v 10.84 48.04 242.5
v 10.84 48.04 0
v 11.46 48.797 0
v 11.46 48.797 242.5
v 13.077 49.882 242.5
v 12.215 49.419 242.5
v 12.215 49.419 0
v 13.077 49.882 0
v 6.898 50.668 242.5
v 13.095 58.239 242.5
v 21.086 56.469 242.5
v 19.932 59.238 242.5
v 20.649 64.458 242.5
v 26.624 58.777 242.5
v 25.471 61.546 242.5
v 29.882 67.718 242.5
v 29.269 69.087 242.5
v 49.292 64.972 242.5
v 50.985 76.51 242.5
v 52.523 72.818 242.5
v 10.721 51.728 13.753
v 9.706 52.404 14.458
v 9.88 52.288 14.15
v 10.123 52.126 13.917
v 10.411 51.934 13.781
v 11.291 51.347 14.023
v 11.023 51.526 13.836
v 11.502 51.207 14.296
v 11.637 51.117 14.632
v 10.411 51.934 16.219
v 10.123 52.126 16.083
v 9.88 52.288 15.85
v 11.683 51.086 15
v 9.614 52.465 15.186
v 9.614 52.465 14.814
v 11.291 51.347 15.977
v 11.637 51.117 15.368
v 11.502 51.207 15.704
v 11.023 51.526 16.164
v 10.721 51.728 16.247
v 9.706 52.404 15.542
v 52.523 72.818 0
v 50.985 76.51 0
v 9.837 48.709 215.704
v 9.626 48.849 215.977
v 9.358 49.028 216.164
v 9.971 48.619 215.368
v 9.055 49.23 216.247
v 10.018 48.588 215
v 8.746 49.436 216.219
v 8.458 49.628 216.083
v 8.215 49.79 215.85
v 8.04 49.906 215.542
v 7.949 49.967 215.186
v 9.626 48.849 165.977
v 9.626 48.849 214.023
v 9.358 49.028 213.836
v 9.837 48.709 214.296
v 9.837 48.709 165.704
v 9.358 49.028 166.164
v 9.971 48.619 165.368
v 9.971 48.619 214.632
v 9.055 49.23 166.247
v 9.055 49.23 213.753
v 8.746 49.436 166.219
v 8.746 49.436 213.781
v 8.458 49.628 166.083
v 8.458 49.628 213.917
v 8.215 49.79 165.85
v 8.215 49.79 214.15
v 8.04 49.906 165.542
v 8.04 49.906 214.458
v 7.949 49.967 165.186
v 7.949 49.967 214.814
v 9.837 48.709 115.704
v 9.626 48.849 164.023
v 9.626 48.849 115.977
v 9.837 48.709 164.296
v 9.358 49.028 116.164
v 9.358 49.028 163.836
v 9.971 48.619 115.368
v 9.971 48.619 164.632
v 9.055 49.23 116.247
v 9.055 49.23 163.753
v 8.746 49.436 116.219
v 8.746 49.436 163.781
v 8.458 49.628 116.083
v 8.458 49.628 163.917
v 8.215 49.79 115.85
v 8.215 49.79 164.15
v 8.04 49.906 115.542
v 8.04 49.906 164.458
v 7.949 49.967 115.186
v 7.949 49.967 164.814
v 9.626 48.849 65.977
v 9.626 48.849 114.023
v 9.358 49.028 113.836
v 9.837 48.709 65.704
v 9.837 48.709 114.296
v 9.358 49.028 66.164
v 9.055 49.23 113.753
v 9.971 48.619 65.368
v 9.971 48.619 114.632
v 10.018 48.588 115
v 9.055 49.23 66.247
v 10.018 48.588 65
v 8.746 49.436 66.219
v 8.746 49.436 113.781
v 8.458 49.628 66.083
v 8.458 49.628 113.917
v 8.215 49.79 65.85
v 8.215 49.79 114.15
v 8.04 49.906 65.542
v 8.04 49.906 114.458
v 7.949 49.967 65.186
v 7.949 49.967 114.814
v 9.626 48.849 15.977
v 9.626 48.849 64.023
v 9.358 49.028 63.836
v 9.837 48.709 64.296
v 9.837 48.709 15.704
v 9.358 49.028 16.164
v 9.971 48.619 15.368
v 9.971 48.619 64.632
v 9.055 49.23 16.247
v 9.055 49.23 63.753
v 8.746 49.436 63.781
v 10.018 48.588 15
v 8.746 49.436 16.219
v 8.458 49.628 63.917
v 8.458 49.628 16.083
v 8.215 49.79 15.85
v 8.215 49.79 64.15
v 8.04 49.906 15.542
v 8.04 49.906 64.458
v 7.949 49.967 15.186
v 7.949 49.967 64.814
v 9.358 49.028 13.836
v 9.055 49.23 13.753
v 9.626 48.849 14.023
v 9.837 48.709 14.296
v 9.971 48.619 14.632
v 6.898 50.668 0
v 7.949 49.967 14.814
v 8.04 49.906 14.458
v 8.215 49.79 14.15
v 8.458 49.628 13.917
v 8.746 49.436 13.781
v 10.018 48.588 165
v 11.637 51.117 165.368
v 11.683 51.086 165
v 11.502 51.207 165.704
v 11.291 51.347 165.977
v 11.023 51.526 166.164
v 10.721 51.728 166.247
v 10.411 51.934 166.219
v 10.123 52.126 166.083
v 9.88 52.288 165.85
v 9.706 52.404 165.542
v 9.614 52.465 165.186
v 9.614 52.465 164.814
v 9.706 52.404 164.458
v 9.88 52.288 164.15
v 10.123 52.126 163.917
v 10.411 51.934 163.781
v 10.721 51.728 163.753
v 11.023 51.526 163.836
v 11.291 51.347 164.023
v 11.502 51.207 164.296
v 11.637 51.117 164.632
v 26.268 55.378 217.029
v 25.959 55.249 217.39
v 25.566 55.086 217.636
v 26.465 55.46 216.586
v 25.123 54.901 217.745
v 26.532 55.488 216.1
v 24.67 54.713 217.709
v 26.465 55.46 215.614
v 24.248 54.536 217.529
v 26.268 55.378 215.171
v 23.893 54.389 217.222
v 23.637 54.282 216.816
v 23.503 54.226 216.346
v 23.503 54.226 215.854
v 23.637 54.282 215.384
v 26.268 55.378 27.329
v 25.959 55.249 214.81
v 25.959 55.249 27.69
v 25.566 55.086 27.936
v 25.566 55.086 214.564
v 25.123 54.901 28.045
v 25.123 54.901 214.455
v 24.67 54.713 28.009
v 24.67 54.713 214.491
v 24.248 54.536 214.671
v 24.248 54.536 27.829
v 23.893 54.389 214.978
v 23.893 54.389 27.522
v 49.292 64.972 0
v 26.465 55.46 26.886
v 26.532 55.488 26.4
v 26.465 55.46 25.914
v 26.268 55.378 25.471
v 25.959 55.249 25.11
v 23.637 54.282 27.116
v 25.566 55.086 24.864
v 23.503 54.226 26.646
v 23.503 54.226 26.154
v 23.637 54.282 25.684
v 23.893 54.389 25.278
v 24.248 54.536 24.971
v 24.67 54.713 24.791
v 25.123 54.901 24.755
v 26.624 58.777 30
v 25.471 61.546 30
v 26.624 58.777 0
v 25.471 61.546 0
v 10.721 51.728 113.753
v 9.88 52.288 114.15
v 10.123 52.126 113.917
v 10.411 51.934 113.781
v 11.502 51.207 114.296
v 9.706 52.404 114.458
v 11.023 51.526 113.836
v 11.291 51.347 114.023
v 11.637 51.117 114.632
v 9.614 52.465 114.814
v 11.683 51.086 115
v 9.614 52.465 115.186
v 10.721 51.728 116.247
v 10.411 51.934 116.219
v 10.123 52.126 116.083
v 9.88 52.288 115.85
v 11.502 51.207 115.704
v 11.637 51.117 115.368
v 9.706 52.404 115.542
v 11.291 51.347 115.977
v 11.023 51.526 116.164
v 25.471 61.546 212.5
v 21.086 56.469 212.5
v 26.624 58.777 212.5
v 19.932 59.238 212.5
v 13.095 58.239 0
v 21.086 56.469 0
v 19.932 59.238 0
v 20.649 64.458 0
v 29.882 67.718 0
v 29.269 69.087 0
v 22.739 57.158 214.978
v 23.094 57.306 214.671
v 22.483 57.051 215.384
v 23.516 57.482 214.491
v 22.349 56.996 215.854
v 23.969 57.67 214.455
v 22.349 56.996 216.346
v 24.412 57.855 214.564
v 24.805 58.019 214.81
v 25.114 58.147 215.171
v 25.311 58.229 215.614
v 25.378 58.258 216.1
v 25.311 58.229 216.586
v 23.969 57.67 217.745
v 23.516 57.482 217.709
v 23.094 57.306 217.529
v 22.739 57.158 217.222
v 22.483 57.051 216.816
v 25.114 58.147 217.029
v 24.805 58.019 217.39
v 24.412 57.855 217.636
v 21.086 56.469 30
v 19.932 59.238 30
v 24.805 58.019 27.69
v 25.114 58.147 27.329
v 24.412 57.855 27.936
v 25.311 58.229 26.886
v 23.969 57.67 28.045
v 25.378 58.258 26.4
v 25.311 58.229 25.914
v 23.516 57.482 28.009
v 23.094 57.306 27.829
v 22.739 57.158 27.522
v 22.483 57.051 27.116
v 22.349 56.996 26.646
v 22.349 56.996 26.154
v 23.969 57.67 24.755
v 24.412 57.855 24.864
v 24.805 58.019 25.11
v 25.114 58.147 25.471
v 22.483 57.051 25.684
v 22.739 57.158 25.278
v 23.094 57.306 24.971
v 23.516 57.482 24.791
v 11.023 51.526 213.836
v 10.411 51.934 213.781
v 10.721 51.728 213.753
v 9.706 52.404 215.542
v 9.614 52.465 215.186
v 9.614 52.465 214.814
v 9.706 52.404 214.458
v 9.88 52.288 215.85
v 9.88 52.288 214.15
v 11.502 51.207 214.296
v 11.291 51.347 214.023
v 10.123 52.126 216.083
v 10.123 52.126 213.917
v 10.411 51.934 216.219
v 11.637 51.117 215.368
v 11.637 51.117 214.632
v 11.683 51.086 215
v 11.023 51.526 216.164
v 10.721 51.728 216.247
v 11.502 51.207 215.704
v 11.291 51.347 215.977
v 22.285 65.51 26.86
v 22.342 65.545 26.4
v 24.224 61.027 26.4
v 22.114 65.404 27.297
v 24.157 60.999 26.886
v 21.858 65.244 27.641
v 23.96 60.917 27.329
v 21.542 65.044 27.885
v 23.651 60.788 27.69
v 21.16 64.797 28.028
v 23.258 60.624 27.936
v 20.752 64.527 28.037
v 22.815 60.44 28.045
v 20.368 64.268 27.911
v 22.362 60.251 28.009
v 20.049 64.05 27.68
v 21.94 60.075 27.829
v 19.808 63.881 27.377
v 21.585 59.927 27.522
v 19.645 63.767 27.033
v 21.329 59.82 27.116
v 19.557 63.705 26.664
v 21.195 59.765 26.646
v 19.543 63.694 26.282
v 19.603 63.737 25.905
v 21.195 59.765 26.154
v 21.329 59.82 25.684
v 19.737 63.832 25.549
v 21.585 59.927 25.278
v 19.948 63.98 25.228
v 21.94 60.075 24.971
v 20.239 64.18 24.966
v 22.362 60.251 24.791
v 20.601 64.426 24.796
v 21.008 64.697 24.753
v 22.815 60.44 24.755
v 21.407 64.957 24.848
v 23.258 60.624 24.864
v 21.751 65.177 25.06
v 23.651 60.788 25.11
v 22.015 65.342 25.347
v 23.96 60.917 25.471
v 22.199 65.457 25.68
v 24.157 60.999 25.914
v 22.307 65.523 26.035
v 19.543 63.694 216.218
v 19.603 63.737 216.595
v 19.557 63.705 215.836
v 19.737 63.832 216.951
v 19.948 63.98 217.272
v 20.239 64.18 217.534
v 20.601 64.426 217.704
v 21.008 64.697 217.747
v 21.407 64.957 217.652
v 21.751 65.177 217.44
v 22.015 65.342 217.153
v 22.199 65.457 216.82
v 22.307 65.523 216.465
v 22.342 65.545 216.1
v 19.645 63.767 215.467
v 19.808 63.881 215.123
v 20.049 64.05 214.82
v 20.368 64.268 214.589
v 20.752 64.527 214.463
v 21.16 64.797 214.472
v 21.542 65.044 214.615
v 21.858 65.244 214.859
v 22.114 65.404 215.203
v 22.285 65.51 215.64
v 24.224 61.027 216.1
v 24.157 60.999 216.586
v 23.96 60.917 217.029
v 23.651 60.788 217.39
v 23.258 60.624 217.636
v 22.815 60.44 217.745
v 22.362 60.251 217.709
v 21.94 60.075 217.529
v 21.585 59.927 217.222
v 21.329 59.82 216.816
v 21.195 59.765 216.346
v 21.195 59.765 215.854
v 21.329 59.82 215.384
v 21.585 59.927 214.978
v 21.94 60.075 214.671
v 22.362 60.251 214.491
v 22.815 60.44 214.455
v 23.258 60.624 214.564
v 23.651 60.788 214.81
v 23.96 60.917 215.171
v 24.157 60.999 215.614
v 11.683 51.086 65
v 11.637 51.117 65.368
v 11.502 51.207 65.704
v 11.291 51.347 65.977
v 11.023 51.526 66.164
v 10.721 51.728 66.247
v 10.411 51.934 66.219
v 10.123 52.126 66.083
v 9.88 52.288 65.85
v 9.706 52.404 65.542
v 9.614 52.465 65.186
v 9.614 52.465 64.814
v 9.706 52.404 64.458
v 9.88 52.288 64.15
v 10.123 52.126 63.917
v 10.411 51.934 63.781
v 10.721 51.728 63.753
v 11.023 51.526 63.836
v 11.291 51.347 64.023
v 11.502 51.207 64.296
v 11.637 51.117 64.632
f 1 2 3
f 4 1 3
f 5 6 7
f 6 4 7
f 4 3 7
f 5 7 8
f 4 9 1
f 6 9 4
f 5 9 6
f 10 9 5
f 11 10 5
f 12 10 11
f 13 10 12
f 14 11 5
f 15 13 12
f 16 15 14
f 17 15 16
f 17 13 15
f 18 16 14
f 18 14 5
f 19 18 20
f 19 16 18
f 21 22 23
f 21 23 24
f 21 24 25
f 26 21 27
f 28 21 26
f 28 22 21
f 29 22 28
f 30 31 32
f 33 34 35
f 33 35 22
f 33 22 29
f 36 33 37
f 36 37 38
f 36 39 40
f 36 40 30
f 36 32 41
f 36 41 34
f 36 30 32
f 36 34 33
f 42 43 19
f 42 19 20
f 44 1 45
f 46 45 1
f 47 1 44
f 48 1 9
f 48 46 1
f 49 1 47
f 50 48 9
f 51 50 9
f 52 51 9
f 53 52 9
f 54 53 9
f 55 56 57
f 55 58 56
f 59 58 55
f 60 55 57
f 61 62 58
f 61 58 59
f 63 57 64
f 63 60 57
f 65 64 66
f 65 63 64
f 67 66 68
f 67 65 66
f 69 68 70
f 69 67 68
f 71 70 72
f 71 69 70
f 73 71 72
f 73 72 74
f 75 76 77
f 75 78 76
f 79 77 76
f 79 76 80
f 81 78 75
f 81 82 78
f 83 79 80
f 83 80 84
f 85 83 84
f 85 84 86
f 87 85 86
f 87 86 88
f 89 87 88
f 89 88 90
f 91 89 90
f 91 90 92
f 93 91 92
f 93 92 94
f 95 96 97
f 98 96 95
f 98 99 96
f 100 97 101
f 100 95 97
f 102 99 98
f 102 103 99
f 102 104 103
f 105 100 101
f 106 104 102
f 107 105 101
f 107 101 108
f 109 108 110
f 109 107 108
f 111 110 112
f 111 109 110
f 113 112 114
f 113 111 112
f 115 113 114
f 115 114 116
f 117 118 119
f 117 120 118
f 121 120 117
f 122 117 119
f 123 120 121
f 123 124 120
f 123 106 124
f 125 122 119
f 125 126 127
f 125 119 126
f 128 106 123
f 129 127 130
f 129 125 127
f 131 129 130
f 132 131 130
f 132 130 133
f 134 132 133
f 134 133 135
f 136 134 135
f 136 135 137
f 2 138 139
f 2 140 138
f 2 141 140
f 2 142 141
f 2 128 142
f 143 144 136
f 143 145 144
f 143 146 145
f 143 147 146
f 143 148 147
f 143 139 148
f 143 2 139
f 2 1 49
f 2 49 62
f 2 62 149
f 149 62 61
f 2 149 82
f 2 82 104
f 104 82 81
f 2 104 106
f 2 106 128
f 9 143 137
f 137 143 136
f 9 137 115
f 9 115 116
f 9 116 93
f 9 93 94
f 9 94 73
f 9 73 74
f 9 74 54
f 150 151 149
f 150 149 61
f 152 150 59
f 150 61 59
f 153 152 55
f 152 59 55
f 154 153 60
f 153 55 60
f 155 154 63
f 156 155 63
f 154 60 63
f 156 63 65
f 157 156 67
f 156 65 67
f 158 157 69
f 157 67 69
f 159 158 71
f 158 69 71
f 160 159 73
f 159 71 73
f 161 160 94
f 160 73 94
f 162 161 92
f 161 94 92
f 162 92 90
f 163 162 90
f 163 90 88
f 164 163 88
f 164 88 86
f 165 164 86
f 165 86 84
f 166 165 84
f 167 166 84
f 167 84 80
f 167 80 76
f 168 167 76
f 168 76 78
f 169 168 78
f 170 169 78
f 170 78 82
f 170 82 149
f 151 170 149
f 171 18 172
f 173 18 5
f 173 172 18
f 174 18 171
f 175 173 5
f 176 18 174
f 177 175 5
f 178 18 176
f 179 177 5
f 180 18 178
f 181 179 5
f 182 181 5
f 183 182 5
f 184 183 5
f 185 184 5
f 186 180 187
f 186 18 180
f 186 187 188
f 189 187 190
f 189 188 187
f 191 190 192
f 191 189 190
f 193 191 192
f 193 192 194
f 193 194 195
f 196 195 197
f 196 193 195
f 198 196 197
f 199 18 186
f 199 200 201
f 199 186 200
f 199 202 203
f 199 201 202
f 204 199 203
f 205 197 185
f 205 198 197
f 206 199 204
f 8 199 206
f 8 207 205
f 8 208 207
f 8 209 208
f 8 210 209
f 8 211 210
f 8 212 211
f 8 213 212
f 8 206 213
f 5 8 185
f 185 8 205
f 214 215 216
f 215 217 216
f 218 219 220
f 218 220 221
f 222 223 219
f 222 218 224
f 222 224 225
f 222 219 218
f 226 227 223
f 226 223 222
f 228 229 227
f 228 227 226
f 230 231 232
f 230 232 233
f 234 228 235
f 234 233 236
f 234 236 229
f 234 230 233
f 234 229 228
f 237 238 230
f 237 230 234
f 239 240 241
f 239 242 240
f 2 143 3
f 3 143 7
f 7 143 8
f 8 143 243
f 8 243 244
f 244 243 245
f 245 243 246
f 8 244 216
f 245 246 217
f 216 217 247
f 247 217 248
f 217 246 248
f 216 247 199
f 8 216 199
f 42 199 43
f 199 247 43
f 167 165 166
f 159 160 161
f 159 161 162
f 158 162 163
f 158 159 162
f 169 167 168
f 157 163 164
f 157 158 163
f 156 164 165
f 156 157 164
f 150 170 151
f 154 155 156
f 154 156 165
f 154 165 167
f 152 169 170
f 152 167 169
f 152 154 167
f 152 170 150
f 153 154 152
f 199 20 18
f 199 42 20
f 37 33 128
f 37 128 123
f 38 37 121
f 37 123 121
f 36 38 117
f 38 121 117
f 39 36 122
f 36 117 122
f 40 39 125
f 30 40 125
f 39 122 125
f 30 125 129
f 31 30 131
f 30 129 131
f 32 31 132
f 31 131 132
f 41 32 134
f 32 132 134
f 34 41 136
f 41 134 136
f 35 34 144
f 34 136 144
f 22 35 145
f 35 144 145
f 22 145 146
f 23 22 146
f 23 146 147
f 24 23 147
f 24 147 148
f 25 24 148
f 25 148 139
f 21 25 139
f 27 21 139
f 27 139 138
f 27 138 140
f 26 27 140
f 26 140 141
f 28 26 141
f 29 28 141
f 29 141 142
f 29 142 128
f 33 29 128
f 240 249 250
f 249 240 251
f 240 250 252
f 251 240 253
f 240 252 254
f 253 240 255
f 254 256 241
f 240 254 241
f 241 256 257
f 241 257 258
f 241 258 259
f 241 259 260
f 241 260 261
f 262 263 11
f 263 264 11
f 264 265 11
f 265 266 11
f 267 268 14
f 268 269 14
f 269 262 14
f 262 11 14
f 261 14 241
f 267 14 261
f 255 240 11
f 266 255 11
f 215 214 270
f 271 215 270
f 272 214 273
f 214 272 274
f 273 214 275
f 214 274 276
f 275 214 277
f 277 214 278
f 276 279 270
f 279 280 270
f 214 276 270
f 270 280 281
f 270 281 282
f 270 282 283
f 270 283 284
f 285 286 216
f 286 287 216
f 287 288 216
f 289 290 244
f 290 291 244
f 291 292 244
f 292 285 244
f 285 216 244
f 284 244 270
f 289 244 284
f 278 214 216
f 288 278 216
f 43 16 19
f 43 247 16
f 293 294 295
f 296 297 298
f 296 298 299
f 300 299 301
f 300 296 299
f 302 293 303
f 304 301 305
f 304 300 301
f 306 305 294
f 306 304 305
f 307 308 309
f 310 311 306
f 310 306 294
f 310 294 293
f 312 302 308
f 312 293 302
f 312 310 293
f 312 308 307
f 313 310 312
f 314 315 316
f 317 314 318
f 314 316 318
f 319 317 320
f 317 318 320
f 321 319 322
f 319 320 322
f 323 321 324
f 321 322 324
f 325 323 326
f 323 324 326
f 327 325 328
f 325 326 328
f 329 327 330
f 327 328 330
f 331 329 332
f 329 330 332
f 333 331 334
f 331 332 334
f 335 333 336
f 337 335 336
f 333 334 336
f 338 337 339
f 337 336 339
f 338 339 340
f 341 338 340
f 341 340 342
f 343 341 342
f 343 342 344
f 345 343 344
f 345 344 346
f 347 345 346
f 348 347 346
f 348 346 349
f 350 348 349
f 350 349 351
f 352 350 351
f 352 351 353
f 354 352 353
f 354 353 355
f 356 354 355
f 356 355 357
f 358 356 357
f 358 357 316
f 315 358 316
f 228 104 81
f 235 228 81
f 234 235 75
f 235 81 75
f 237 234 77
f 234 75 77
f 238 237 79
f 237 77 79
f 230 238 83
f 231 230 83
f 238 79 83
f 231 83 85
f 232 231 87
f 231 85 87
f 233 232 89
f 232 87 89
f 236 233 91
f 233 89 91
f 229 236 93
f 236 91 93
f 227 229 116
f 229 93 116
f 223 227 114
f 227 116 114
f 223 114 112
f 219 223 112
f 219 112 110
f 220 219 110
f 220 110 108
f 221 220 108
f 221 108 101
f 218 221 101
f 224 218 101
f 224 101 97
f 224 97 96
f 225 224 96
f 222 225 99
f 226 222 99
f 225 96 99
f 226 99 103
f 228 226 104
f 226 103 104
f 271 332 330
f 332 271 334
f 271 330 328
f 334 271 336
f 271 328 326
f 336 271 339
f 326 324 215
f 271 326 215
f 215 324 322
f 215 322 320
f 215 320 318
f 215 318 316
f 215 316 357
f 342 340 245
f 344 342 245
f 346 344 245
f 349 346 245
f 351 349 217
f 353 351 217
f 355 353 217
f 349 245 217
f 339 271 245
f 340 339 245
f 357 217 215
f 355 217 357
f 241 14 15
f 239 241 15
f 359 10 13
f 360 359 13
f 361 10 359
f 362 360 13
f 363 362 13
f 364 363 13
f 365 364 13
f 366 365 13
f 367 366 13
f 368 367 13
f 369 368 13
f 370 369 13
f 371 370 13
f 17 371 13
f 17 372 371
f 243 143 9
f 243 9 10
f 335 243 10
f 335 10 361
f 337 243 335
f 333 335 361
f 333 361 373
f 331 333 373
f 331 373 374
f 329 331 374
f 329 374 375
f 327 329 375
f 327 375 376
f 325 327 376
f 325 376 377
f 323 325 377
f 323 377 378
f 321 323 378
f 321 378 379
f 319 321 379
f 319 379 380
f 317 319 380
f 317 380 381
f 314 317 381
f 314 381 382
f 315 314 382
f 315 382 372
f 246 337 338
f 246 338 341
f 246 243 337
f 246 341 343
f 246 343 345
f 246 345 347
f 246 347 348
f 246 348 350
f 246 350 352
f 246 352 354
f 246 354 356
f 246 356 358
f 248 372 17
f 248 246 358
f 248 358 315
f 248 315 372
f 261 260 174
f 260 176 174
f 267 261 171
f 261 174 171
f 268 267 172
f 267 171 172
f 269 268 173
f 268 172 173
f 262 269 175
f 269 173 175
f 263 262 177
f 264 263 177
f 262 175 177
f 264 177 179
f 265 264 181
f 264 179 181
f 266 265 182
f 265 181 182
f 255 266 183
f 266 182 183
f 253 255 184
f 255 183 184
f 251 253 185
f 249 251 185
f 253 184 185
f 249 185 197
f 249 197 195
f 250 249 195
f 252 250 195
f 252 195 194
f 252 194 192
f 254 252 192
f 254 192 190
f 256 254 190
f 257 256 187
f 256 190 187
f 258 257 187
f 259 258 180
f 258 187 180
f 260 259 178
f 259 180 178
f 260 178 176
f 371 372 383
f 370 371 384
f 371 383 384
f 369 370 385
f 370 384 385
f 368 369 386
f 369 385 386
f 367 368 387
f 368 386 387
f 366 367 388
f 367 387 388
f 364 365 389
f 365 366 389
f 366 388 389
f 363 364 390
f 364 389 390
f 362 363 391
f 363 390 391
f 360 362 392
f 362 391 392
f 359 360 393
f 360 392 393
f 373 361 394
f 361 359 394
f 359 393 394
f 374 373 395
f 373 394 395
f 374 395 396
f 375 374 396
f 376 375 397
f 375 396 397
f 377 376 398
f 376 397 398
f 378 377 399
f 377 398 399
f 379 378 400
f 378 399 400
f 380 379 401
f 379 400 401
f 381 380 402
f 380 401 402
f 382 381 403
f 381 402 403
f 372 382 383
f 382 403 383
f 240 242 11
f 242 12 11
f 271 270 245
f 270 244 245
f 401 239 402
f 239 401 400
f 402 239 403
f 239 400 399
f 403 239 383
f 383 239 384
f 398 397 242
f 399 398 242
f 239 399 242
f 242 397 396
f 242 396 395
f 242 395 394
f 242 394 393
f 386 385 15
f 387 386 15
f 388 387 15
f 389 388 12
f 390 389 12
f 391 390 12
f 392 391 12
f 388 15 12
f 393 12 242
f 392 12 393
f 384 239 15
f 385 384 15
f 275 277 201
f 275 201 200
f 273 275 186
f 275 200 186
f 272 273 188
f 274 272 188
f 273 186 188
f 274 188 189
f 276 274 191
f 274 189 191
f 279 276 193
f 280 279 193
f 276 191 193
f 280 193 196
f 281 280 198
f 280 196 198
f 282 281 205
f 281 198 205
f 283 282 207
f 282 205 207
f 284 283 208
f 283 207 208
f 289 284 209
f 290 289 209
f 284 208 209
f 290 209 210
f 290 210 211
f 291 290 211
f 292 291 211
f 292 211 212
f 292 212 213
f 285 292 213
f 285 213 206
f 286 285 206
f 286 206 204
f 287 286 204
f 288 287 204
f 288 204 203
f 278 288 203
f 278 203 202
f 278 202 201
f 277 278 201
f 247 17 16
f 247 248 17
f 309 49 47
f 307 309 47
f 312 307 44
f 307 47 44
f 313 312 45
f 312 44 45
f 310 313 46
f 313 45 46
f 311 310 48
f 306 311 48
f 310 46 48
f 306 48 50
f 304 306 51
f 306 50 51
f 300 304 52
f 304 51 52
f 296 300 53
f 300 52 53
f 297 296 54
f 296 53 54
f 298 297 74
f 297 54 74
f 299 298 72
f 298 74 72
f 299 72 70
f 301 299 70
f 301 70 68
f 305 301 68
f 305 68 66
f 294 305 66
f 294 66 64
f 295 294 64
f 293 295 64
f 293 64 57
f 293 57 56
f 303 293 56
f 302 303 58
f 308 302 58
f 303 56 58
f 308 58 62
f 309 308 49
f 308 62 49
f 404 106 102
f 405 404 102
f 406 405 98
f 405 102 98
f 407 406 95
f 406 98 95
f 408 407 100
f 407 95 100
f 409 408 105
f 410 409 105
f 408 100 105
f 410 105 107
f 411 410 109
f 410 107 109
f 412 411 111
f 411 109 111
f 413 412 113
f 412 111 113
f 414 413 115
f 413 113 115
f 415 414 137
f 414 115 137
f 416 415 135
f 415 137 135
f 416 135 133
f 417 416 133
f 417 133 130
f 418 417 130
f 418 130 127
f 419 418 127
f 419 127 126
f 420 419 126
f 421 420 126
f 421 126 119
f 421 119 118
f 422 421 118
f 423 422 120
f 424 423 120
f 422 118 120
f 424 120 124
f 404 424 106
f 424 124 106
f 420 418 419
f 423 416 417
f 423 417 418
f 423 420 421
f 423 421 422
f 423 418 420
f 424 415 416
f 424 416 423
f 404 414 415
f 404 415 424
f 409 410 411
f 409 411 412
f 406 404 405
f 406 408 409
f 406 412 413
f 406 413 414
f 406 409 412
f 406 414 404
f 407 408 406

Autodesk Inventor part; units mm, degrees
ref_plane "YZ Plane" through (0, 0, 0) normal (1, 0, 0) x (0, 1, 0)
ref_plane "XZ Plane" through (0, 0, 0) normal (0, 1, 0) x (-1, 0, 0)
sketch "Sketch1" plane through (0, 0, 0) normal (0, 0, 1) x (1, 0, 0)
  line L0 (10, 0) -> (-1.5, 0) projected
  line L1 (10, 45.2667) -> (10, 0) projected
  arc A0 (13.0769, 49.8821) -> (10, 45.2667) centre (15, 45.2667) ccw projected
  line L2 (54.8615, 67.2923) -> (13.0769, 49.8821) projected
  line L3 (50.4385, 77.9077) -> (54.8615, 67.2923) projected
  line L4 (50.4385, 77.9077) -> (29.2692, 69.0872) projected
  arc A1 (29.2692, 69.0872) -> (-1.5, 22.9333) centre (48.5, 22.9333) ccw projected
  line L5 (-1.5, 0) -> (-1.5, 22.9333) projected
  line L6 (29.2692, 69.0872) -> (33.9692, 58.5872)
  line L7 (15, 45.2667) -> (6.8975, 50.6683)
  line L8 (29.2692, 69.0872) -> (50.4077, 77.8949)
  line L9 (50.4077, 77.8949) -> (52.5231, 72.8179)
  line L10 (52.5231, 72.8179) -> (49.2923, 64.9718)
  line L11 (29.8823, 67.7176) -> (50.9846, 76.5103)
  point P0 (0, 0)
  point P1 (10.8397, 48.0402)
  dimension "d2" = 22.9
  dimension "d3" = 5.5
  dimension "d4" = 45
  dimension "d5" = 1.5
extrude "Extrusion1" add sketch "Sketch1" along normal blind 242.5 contours L7 A1 L6 L2 A0 | L6 L11 L9 L10 L2
sketch "Sketch2" plane through (10.8397, 48.0402, 0) normal (-0.5547002, -0.8320503, 0) x (0.8320503, -0.5547002, 0)
  line L0 (-4.738, 0) -> (0, 0) projected
  line L1 (0, 0) -> (0, 242.5) projected
  line L2 (-4.738, 242.5) -> (0, 242.5) projected
  line L3 (-4.738, 0) -> (-4.738, 242.5) projected
  circle A0 centre (-2.238, 15) radius 1.25
  circle A1 centre (-2.238, 65) radius 1.25
  circle A2 centre (-2.238, 115) radius 1.25
  circle A3 centre (-2.238, 165) radius 1.25
  circle A4 centre (-2.238, 215) radius 1.25
  point P0 (17.6287, 0)
  dimension "d6" = 2.5
  dimension "d7" = 2.5
  dimension "d8" = 15
  dimension "d11" = 50
extrude "Extrusion2" cut sketch "Sketch2" against normal blind 3 contours A0 | A1 | A2 | A3 | A4
sketch "Sketch3" plane through (0, 0, 0) normal (0, 0, -1) x (-1, 0, 0)
  line L0 (-13.0769, 49.8821) -> (-49.2923, 64.9718) projected
  line L1 (-26.6245, 58.7769) -> (-21.086, 56.4692)
  line L2 (-21.086, 56.4692) -> (-19.9322, 59.2384)
  line L3 (-19.9322, 59.2384) -> (-25.4706, 61.5461)
  line L4 (-25.4706, 61.5461) -> (-26.6245, 58.7769)
  arc A0 (-10.8397, 48.0402) -> (-13.0769, 49.8821) centre (-15, 45.2667) ccw projected
  line L5 (-6.8975, 50.6683) -> (-10.8397, 48.0402) projected
  arc A1 (-6.8975, 50.6683) -> (-29.2692, 69.0872) centre (-48.5, 22.9333) ccw projected
  line L6 (-29.8823, 67.7176) -> (-29.2692, 69.0872) projected
  line L7 (-50.9846, 76.5103) -> (-29.8823, 67.7176) projected
  line L8 (-52.5231, 72.8179) -> (-50.9846, 76.5103) projected
  line L9 (-49.2923, 64.9718) -> (-52.5231, 72.8179) projected
  line L10 (-13.0769, 49.8821) -> (-49.2923, 64.9718) projected
  point P0 (0, 0)
  dimension "d20" = 6
  dimension "d21" = 3
  dimension "d22" = 3
  dimension "d32" = 12.7
extrude "Extrusion3" cut sketch "Sketch3" against normal blind 30 contours L4 L3 L2 L1
sketch "Sketch4" plane through (49.2923, 64.9718, 0) normal (0.3846154, -0.9230769, 0) x (0.9230769, 0.3846154, 0)
  line L0 (-29.3068, 0) -> (-23.3068, 0) projected
  line L1 (-29.3068, 0) -> (-29.3068, 30) projected
  line L2 (-29.3068, 30) -> (-23.3068, 30) projected
  line L3 (-23.3068, 0) -> (-23.3068, 30) projected
  circle A0 centre (-26.3068, 26.4) radius 1.65
  line L4 (-26.3068, 29.7486) -> (-23.4068, 28.0743)
  line L5 (-23.4068, 28.0743) -> (-23.4068, 24.7257)
  line L6 (-23.4068, 24.7257) -> (-26.3068, 23.0514)
  line L7 (-26.3068, 23.0514) -> (-29.2068, 24.7257)
  line L8 (-29.2068, 24.7257) -> (-29.2068, 28.0743)
  line L9 (-29.2068, 28.0743) -> (-26.3068, 29.7486)
  point P0 (-70.4897, 0)
  point P1 (-26.3068, 30)
  dimension "d26" = 3.3
  dimension "d27" = 3.6
  dimension "d28" = 5.8
extrude "Extrusion4" cut sketch "Sketch4" against normal through all contours A0
ref_plane "Work Plane1" through (0, 0, 121.25) normal (0, 0, -1) x (-1, 0, 0)
mirror "Mirror1" about plane through (0, 0, 121.25) normal (0, 0, -1) of "Extrusion4", "Extrusion3"
properties part number "ESQUINA_REDONDEADA_R50"
